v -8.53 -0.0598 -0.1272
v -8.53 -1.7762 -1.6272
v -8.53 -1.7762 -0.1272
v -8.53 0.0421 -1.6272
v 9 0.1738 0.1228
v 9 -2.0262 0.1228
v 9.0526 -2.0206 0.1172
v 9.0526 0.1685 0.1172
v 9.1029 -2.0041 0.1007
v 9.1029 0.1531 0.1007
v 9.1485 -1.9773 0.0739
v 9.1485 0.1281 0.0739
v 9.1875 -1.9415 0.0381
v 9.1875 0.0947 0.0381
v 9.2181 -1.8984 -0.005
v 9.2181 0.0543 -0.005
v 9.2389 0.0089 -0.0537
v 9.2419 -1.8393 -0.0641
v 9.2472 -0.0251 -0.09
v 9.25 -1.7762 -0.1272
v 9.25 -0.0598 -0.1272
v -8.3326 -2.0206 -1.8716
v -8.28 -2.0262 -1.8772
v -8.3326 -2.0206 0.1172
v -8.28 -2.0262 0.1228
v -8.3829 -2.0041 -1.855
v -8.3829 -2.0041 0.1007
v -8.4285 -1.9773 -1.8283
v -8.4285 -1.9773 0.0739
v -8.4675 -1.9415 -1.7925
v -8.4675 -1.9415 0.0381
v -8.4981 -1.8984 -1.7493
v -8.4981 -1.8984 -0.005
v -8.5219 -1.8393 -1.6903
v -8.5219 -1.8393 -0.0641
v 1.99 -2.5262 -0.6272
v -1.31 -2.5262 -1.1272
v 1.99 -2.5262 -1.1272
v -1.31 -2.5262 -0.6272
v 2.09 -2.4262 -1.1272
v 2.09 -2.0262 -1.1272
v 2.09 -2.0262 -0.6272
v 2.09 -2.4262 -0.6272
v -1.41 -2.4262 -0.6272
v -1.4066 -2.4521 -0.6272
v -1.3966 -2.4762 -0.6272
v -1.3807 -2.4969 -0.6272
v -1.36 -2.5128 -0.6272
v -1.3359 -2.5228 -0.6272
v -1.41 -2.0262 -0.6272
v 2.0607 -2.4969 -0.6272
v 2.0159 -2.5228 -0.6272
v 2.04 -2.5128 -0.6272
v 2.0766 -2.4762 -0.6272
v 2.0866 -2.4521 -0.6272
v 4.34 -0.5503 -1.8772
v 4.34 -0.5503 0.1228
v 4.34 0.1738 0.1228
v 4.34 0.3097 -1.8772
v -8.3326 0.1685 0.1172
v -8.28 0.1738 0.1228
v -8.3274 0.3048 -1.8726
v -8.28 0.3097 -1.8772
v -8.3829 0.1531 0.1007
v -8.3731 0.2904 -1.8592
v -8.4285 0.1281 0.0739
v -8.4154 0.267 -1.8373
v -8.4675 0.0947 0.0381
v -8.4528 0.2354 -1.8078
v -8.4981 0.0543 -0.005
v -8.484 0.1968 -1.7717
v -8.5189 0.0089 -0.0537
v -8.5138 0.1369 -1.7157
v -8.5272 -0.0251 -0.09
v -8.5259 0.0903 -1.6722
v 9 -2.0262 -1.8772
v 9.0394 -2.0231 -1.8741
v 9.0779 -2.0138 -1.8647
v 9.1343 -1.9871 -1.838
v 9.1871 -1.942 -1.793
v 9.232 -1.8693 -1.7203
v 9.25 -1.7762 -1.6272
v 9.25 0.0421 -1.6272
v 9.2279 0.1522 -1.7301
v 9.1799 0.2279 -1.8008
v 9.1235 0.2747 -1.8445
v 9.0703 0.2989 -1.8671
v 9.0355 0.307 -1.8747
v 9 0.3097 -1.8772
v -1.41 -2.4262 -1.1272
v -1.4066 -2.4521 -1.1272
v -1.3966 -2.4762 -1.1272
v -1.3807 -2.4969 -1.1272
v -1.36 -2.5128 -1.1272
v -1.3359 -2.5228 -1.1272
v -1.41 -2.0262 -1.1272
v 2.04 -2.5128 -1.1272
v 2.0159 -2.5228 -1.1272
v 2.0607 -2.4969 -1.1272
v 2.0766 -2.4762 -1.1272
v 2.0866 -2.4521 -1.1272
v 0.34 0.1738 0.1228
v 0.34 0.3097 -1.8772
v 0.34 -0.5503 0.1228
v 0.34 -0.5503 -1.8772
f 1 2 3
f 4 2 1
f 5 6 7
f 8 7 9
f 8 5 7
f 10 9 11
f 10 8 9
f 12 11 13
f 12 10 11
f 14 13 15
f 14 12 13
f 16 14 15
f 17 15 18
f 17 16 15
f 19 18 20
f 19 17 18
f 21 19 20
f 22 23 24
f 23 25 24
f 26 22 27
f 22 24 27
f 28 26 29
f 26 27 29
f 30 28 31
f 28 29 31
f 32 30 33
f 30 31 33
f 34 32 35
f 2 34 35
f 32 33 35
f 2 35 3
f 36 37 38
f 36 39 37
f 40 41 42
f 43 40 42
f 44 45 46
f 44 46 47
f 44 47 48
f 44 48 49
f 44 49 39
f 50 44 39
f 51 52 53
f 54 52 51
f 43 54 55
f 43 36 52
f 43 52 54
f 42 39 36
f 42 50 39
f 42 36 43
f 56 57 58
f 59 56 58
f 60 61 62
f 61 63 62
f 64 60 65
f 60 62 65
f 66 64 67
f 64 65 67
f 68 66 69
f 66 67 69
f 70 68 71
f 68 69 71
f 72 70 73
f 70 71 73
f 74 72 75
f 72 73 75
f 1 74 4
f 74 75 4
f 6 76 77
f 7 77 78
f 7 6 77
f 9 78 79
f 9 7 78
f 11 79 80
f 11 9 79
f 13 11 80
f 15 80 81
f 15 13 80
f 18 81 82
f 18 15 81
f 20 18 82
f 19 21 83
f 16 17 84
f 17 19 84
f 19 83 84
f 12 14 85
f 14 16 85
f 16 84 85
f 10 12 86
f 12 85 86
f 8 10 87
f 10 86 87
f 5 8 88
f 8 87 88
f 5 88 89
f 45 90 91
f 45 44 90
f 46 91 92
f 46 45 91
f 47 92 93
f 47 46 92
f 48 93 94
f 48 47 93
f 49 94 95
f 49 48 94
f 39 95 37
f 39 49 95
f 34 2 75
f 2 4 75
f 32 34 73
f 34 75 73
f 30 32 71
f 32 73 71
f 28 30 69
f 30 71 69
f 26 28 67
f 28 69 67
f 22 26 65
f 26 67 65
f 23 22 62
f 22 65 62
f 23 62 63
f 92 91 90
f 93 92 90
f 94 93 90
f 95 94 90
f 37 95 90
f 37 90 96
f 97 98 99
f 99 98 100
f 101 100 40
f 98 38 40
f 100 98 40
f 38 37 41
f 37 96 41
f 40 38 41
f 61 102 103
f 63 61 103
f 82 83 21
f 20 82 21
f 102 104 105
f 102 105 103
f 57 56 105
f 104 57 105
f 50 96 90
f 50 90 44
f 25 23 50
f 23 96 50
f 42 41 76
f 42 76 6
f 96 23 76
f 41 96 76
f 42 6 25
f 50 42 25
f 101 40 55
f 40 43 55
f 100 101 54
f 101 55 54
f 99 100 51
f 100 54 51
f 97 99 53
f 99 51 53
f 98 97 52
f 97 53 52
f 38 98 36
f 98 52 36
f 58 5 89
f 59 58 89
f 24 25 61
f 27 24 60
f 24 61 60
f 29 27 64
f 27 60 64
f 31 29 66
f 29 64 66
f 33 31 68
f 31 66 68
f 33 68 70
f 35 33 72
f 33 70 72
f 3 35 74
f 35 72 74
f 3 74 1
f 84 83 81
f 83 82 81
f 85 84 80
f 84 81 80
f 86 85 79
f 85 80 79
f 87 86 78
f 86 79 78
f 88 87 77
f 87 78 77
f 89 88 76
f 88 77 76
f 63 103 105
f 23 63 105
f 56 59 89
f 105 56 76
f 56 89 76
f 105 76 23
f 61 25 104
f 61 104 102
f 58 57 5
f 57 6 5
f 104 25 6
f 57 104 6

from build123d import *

# Parameters (mm, degrees)
BOSS_EXTRUDE3_DEPTH = 9.25
SKETCH5_W           = 4
SKETCH5_H           = 0.86
CUT_EXTRUDE1_DEPTH  = 2
SKETCH6_W           = 3.5
SKETCH6_H           = 0.5
BOSS_EXTRUDE4_DEPTH = 0.5
SKETCH7_W           = 0.72
SKETCH7_H           = 2.3359
CUT_EXTRUDE2_DEPTH  = 2
FILLET1_R           = 0.25
FILLET2_R           = 0.1


with BuildPart() as part:
    # Sketch1 → Boss-Extrude3 (new body, symmetric)
    with BuildSketch(Plane(origin=(0, 0, 0), x_dir=(0, 0, -1), z_dir=(1, 0, 0))):
        Polygon((-0.122813016, -2.026219673), (-0.122813016, 0.173780327), (1.877186984, 0.309680327), (1.877186984, -2.026219673), align=None)
    extrude(amount=BOSS_EXTRUDE3_DEPTH, both=True)

    # Sketch5 → Cut-Extrude1 (cut)
    with BuildSketch(Plane(origin=(0, 0, -1.877186984), x_dir=(-1, 0, 0), z_dir=(0, 0, -1))):
        with Locations((-2.34, -0.120319673)):
            Rectangle(SKETCH5_W, SKETCH5_H)
    extrude(amount=-CUT_EXTRUDE1_DEPTH, mode=Mode.SUBTRACT)

    # Sketch6 → Boss-Extrude4 (add)
    with BuildSketch(Plane.XZ.offset(2.026219673)):
        with Locations((0.34, -0.877186984)):
            Rectangle(SKETCH6_W, SKETCH6_H)
    extrude(amount=BOSS_EXTRUDE4_DEPTH)

    # Sketch7 → Cut-Extrude2 (cut)
    with BuildSketch(Plane(origin=(0, 0, -1.877186984), x_dir=(-1, 0, 0), z_dir=(0, 0, -1))):
        with Locations((8.89, -0.858269673)):
            Rectangle(SKETCH7_W, SKETCH7_H)
    extrude(amount=-CUT_EXTRUDE2_DEPTH, mode=Mode.SUBTRACT)

    # Fillet1
    fillet1_edges = [part.edges().sort_by_distance(p)[0] for p in [
        (9.25, -0.858269673, -1.877186984),
        (9.25, -2.026219673, -0.877186984),
        (9.25, -0.926219673, 0.122813016),
        (-8.53, 0.241730327, -0.877186984),
        (-8.53, -0.926219673, 0.122813016),
        (-8.53, -2.026219673, -0.877186984),
        (-8.53, -0.858269673, -1.877186984),
        (9.25, 0.241730327, -0.877186984),
    ]]
    fillet(fillet1_edges, radius=FILLET1_R)

    # Fillet2
    fillet2_edges = [part.edges().sort_by_distance(p)[0] for p in [
        (-1.41, -2.526219673, -0.877186984),
        (2.09, -2.526219673, -0.877186984),
    ]]
    fillet(fillet2_edges, radius=FILLET2_R)


solid = part.part
